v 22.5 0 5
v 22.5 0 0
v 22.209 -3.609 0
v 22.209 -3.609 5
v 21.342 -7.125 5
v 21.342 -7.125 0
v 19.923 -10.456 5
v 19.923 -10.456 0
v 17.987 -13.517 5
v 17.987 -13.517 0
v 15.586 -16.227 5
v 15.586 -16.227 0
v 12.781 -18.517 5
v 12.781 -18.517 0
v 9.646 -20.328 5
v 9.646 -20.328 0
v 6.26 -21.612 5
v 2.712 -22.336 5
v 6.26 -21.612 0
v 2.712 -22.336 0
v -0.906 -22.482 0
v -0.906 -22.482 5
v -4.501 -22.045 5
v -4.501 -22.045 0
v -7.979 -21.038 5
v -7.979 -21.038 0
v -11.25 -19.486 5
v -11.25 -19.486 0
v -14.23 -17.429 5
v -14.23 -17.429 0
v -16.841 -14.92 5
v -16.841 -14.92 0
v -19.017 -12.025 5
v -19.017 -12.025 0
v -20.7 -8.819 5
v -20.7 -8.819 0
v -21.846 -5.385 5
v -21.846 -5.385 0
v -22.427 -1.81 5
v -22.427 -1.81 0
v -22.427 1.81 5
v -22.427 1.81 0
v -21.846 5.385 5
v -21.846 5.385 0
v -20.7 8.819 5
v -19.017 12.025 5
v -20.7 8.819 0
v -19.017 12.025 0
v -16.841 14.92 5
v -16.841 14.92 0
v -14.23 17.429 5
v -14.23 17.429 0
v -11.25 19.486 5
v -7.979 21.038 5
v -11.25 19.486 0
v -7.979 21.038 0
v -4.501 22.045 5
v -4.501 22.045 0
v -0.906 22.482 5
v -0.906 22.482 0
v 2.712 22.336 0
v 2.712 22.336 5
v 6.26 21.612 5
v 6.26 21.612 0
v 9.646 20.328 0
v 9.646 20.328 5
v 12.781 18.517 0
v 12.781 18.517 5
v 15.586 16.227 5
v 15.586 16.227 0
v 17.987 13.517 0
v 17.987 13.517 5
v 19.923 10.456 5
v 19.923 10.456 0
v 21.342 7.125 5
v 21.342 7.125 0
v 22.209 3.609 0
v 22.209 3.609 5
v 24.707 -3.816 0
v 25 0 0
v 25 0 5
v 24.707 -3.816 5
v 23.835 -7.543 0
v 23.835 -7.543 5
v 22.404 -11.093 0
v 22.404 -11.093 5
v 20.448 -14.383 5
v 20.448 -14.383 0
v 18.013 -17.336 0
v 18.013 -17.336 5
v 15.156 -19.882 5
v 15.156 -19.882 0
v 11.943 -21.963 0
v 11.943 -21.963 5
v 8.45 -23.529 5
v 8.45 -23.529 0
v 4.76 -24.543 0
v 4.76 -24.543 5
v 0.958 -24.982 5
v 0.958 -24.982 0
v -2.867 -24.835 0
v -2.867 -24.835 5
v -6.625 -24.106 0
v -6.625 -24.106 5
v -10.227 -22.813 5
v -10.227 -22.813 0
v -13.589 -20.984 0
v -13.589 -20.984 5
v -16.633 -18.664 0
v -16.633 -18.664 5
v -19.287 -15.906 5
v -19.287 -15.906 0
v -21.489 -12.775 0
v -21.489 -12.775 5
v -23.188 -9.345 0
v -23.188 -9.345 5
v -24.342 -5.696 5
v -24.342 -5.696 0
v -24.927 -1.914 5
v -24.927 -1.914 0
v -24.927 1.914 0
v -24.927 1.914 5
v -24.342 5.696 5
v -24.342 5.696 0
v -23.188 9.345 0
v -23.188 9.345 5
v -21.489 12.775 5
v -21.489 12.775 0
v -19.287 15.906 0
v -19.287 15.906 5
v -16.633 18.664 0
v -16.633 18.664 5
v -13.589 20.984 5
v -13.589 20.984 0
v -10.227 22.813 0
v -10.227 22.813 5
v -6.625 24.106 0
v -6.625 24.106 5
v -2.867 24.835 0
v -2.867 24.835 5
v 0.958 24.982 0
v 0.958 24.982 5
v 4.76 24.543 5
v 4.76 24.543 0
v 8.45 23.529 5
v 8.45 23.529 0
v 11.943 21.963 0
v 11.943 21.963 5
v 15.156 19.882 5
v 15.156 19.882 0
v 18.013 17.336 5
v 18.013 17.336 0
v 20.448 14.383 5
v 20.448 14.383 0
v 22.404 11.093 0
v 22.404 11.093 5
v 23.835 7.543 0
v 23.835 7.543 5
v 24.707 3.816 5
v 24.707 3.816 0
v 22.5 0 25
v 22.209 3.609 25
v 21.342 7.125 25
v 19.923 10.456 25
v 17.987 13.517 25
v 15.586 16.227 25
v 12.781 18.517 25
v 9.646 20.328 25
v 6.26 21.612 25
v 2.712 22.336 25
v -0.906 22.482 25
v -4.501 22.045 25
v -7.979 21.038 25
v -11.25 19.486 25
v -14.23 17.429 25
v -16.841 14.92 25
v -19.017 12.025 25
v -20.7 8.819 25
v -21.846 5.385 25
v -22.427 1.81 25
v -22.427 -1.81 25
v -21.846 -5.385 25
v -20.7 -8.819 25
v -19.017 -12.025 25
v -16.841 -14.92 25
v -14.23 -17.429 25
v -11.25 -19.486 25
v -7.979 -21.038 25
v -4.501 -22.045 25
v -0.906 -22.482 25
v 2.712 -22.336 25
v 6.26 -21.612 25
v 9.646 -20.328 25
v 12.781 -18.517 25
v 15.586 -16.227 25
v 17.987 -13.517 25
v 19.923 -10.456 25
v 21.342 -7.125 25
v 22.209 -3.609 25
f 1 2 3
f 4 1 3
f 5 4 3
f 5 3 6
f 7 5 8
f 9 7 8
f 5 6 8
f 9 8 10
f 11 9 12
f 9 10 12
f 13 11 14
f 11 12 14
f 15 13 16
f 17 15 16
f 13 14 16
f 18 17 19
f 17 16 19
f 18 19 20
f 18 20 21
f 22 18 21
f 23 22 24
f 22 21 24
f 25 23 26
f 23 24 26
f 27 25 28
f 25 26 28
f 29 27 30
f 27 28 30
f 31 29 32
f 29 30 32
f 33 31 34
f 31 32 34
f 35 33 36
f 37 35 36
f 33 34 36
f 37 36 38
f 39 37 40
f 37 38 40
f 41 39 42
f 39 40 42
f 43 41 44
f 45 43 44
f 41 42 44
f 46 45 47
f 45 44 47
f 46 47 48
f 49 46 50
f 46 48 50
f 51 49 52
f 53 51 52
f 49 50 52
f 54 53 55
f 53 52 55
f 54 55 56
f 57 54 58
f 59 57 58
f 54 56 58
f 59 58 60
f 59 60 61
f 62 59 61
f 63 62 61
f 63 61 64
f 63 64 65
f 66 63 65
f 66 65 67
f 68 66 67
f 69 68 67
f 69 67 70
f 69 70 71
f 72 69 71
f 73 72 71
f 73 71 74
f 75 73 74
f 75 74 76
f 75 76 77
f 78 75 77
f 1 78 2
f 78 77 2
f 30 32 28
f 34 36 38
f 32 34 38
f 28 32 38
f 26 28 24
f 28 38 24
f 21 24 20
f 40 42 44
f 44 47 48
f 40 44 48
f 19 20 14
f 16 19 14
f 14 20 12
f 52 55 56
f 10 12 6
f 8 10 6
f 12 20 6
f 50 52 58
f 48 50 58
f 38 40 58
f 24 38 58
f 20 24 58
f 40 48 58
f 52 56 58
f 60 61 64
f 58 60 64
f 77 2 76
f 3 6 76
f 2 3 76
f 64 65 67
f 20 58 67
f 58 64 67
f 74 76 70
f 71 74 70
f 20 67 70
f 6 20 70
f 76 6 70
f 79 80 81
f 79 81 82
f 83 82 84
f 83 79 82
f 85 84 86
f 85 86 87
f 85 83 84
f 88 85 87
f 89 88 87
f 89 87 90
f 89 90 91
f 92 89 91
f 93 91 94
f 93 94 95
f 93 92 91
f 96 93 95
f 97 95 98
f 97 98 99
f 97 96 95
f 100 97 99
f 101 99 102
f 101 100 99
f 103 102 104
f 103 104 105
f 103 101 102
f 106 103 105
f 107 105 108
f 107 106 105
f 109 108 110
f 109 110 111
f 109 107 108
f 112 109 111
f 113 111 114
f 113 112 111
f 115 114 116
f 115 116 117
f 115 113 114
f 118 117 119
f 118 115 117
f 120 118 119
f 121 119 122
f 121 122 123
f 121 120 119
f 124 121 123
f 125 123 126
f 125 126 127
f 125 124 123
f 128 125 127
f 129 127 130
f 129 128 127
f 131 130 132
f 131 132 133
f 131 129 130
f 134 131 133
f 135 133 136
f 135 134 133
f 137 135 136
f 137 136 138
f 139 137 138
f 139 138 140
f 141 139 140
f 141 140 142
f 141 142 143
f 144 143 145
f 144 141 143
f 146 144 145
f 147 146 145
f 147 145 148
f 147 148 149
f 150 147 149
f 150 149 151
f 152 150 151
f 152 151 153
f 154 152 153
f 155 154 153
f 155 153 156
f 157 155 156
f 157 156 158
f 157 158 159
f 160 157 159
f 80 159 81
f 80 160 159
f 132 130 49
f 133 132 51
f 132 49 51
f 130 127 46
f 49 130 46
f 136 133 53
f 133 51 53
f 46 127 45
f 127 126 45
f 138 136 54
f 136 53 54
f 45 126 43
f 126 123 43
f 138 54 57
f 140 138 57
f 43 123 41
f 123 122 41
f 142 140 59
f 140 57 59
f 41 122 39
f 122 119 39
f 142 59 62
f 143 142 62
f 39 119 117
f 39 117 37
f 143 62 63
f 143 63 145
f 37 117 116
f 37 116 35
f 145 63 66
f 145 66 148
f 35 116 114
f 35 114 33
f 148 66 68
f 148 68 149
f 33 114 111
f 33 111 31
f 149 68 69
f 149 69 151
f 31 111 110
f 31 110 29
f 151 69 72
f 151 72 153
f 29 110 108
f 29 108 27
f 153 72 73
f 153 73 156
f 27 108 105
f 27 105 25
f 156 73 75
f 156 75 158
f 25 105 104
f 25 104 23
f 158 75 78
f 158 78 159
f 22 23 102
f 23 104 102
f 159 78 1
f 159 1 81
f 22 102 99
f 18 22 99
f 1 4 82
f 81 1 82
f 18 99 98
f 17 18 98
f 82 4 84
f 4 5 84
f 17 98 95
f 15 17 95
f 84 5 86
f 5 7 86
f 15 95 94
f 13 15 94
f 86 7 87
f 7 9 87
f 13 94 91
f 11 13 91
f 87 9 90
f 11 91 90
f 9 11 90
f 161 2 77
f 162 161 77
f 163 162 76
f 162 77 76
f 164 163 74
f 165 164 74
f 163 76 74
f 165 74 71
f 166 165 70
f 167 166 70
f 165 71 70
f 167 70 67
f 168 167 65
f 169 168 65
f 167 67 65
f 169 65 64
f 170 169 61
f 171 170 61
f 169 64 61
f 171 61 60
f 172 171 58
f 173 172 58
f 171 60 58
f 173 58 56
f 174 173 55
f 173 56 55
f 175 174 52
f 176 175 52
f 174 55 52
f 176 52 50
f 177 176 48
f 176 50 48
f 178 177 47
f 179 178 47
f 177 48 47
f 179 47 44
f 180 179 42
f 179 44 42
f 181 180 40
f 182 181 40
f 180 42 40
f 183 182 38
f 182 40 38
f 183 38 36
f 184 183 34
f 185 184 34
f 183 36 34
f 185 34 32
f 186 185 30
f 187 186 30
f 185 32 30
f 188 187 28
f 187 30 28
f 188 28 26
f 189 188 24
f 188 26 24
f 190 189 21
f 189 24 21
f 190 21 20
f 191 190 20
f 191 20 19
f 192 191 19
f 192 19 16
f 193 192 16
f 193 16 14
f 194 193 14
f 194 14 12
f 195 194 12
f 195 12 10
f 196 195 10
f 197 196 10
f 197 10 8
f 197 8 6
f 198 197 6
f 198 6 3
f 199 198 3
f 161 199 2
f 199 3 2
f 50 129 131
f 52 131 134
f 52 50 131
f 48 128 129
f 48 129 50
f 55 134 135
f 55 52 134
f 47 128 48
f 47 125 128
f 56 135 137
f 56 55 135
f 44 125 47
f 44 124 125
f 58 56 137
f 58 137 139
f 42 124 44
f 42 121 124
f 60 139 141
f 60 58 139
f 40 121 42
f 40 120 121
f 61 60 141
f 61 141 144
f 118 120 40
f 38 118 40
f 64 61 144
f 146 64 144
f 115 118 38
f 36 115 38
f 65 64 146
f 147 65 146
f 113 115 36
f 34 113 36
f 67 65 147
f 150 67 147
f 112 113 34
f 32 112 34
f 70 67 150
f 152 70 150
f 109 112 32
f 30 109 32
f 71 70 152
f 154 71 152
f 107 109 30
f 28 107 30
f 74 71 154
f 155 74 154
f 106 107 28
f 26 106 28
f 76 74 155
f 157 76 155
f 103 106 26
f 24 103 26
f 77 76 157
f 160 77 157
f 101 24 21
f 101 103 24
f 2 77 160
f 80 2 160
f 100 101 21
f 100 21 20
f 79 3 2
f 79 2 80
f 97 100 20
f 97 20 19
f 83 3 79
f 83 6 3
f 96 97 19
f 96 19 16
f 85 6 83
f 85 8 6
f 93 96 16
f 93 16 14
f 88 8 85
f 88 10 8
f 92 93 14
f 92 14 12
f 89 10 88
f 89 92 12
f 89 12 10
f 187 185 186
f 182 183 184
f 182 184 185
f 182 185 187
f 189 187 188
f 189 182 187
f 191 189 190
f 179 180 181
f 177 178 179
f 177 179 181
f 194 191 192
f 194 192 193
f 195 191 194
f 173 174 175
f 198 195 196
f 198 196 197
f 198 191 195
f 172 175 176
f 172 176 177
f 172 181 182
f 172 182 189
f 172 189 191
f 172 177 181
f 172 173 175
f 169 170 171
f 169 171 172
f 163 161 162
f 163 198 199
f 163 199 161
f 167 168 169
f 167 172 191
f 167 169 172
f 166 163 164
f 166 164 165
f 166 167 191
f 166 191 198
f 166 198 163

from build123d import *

# Parameters (mm, degrees)
F0_R     = 22.5
F1_DEPTH = 25
F2_R     = 25
F2_R_2   = 22.5
F3_DEPTH = 5


with BuildPart() as f1:
    # F0 (on Top) → F1 (new body)
    with BuildSketch(Plane.XY):
        Circle(F0_R)
    extrude(amount=F1_DEPTH)


with BuildPart() as f3:
    # F2 (on face) → F3 (new body)
    with BuildSketch(Plane(origin=(0, 0, 0), x_dir=(1, 0, 0), z_dir=(0, 0, -1))):
        Circle(F2_R)
        Circle(F2_R_2, mode=Mode.SUBTRACT)
    extrude(amount=-F3_DEPTH)


solid = Compound([f1.part, f3.part])
